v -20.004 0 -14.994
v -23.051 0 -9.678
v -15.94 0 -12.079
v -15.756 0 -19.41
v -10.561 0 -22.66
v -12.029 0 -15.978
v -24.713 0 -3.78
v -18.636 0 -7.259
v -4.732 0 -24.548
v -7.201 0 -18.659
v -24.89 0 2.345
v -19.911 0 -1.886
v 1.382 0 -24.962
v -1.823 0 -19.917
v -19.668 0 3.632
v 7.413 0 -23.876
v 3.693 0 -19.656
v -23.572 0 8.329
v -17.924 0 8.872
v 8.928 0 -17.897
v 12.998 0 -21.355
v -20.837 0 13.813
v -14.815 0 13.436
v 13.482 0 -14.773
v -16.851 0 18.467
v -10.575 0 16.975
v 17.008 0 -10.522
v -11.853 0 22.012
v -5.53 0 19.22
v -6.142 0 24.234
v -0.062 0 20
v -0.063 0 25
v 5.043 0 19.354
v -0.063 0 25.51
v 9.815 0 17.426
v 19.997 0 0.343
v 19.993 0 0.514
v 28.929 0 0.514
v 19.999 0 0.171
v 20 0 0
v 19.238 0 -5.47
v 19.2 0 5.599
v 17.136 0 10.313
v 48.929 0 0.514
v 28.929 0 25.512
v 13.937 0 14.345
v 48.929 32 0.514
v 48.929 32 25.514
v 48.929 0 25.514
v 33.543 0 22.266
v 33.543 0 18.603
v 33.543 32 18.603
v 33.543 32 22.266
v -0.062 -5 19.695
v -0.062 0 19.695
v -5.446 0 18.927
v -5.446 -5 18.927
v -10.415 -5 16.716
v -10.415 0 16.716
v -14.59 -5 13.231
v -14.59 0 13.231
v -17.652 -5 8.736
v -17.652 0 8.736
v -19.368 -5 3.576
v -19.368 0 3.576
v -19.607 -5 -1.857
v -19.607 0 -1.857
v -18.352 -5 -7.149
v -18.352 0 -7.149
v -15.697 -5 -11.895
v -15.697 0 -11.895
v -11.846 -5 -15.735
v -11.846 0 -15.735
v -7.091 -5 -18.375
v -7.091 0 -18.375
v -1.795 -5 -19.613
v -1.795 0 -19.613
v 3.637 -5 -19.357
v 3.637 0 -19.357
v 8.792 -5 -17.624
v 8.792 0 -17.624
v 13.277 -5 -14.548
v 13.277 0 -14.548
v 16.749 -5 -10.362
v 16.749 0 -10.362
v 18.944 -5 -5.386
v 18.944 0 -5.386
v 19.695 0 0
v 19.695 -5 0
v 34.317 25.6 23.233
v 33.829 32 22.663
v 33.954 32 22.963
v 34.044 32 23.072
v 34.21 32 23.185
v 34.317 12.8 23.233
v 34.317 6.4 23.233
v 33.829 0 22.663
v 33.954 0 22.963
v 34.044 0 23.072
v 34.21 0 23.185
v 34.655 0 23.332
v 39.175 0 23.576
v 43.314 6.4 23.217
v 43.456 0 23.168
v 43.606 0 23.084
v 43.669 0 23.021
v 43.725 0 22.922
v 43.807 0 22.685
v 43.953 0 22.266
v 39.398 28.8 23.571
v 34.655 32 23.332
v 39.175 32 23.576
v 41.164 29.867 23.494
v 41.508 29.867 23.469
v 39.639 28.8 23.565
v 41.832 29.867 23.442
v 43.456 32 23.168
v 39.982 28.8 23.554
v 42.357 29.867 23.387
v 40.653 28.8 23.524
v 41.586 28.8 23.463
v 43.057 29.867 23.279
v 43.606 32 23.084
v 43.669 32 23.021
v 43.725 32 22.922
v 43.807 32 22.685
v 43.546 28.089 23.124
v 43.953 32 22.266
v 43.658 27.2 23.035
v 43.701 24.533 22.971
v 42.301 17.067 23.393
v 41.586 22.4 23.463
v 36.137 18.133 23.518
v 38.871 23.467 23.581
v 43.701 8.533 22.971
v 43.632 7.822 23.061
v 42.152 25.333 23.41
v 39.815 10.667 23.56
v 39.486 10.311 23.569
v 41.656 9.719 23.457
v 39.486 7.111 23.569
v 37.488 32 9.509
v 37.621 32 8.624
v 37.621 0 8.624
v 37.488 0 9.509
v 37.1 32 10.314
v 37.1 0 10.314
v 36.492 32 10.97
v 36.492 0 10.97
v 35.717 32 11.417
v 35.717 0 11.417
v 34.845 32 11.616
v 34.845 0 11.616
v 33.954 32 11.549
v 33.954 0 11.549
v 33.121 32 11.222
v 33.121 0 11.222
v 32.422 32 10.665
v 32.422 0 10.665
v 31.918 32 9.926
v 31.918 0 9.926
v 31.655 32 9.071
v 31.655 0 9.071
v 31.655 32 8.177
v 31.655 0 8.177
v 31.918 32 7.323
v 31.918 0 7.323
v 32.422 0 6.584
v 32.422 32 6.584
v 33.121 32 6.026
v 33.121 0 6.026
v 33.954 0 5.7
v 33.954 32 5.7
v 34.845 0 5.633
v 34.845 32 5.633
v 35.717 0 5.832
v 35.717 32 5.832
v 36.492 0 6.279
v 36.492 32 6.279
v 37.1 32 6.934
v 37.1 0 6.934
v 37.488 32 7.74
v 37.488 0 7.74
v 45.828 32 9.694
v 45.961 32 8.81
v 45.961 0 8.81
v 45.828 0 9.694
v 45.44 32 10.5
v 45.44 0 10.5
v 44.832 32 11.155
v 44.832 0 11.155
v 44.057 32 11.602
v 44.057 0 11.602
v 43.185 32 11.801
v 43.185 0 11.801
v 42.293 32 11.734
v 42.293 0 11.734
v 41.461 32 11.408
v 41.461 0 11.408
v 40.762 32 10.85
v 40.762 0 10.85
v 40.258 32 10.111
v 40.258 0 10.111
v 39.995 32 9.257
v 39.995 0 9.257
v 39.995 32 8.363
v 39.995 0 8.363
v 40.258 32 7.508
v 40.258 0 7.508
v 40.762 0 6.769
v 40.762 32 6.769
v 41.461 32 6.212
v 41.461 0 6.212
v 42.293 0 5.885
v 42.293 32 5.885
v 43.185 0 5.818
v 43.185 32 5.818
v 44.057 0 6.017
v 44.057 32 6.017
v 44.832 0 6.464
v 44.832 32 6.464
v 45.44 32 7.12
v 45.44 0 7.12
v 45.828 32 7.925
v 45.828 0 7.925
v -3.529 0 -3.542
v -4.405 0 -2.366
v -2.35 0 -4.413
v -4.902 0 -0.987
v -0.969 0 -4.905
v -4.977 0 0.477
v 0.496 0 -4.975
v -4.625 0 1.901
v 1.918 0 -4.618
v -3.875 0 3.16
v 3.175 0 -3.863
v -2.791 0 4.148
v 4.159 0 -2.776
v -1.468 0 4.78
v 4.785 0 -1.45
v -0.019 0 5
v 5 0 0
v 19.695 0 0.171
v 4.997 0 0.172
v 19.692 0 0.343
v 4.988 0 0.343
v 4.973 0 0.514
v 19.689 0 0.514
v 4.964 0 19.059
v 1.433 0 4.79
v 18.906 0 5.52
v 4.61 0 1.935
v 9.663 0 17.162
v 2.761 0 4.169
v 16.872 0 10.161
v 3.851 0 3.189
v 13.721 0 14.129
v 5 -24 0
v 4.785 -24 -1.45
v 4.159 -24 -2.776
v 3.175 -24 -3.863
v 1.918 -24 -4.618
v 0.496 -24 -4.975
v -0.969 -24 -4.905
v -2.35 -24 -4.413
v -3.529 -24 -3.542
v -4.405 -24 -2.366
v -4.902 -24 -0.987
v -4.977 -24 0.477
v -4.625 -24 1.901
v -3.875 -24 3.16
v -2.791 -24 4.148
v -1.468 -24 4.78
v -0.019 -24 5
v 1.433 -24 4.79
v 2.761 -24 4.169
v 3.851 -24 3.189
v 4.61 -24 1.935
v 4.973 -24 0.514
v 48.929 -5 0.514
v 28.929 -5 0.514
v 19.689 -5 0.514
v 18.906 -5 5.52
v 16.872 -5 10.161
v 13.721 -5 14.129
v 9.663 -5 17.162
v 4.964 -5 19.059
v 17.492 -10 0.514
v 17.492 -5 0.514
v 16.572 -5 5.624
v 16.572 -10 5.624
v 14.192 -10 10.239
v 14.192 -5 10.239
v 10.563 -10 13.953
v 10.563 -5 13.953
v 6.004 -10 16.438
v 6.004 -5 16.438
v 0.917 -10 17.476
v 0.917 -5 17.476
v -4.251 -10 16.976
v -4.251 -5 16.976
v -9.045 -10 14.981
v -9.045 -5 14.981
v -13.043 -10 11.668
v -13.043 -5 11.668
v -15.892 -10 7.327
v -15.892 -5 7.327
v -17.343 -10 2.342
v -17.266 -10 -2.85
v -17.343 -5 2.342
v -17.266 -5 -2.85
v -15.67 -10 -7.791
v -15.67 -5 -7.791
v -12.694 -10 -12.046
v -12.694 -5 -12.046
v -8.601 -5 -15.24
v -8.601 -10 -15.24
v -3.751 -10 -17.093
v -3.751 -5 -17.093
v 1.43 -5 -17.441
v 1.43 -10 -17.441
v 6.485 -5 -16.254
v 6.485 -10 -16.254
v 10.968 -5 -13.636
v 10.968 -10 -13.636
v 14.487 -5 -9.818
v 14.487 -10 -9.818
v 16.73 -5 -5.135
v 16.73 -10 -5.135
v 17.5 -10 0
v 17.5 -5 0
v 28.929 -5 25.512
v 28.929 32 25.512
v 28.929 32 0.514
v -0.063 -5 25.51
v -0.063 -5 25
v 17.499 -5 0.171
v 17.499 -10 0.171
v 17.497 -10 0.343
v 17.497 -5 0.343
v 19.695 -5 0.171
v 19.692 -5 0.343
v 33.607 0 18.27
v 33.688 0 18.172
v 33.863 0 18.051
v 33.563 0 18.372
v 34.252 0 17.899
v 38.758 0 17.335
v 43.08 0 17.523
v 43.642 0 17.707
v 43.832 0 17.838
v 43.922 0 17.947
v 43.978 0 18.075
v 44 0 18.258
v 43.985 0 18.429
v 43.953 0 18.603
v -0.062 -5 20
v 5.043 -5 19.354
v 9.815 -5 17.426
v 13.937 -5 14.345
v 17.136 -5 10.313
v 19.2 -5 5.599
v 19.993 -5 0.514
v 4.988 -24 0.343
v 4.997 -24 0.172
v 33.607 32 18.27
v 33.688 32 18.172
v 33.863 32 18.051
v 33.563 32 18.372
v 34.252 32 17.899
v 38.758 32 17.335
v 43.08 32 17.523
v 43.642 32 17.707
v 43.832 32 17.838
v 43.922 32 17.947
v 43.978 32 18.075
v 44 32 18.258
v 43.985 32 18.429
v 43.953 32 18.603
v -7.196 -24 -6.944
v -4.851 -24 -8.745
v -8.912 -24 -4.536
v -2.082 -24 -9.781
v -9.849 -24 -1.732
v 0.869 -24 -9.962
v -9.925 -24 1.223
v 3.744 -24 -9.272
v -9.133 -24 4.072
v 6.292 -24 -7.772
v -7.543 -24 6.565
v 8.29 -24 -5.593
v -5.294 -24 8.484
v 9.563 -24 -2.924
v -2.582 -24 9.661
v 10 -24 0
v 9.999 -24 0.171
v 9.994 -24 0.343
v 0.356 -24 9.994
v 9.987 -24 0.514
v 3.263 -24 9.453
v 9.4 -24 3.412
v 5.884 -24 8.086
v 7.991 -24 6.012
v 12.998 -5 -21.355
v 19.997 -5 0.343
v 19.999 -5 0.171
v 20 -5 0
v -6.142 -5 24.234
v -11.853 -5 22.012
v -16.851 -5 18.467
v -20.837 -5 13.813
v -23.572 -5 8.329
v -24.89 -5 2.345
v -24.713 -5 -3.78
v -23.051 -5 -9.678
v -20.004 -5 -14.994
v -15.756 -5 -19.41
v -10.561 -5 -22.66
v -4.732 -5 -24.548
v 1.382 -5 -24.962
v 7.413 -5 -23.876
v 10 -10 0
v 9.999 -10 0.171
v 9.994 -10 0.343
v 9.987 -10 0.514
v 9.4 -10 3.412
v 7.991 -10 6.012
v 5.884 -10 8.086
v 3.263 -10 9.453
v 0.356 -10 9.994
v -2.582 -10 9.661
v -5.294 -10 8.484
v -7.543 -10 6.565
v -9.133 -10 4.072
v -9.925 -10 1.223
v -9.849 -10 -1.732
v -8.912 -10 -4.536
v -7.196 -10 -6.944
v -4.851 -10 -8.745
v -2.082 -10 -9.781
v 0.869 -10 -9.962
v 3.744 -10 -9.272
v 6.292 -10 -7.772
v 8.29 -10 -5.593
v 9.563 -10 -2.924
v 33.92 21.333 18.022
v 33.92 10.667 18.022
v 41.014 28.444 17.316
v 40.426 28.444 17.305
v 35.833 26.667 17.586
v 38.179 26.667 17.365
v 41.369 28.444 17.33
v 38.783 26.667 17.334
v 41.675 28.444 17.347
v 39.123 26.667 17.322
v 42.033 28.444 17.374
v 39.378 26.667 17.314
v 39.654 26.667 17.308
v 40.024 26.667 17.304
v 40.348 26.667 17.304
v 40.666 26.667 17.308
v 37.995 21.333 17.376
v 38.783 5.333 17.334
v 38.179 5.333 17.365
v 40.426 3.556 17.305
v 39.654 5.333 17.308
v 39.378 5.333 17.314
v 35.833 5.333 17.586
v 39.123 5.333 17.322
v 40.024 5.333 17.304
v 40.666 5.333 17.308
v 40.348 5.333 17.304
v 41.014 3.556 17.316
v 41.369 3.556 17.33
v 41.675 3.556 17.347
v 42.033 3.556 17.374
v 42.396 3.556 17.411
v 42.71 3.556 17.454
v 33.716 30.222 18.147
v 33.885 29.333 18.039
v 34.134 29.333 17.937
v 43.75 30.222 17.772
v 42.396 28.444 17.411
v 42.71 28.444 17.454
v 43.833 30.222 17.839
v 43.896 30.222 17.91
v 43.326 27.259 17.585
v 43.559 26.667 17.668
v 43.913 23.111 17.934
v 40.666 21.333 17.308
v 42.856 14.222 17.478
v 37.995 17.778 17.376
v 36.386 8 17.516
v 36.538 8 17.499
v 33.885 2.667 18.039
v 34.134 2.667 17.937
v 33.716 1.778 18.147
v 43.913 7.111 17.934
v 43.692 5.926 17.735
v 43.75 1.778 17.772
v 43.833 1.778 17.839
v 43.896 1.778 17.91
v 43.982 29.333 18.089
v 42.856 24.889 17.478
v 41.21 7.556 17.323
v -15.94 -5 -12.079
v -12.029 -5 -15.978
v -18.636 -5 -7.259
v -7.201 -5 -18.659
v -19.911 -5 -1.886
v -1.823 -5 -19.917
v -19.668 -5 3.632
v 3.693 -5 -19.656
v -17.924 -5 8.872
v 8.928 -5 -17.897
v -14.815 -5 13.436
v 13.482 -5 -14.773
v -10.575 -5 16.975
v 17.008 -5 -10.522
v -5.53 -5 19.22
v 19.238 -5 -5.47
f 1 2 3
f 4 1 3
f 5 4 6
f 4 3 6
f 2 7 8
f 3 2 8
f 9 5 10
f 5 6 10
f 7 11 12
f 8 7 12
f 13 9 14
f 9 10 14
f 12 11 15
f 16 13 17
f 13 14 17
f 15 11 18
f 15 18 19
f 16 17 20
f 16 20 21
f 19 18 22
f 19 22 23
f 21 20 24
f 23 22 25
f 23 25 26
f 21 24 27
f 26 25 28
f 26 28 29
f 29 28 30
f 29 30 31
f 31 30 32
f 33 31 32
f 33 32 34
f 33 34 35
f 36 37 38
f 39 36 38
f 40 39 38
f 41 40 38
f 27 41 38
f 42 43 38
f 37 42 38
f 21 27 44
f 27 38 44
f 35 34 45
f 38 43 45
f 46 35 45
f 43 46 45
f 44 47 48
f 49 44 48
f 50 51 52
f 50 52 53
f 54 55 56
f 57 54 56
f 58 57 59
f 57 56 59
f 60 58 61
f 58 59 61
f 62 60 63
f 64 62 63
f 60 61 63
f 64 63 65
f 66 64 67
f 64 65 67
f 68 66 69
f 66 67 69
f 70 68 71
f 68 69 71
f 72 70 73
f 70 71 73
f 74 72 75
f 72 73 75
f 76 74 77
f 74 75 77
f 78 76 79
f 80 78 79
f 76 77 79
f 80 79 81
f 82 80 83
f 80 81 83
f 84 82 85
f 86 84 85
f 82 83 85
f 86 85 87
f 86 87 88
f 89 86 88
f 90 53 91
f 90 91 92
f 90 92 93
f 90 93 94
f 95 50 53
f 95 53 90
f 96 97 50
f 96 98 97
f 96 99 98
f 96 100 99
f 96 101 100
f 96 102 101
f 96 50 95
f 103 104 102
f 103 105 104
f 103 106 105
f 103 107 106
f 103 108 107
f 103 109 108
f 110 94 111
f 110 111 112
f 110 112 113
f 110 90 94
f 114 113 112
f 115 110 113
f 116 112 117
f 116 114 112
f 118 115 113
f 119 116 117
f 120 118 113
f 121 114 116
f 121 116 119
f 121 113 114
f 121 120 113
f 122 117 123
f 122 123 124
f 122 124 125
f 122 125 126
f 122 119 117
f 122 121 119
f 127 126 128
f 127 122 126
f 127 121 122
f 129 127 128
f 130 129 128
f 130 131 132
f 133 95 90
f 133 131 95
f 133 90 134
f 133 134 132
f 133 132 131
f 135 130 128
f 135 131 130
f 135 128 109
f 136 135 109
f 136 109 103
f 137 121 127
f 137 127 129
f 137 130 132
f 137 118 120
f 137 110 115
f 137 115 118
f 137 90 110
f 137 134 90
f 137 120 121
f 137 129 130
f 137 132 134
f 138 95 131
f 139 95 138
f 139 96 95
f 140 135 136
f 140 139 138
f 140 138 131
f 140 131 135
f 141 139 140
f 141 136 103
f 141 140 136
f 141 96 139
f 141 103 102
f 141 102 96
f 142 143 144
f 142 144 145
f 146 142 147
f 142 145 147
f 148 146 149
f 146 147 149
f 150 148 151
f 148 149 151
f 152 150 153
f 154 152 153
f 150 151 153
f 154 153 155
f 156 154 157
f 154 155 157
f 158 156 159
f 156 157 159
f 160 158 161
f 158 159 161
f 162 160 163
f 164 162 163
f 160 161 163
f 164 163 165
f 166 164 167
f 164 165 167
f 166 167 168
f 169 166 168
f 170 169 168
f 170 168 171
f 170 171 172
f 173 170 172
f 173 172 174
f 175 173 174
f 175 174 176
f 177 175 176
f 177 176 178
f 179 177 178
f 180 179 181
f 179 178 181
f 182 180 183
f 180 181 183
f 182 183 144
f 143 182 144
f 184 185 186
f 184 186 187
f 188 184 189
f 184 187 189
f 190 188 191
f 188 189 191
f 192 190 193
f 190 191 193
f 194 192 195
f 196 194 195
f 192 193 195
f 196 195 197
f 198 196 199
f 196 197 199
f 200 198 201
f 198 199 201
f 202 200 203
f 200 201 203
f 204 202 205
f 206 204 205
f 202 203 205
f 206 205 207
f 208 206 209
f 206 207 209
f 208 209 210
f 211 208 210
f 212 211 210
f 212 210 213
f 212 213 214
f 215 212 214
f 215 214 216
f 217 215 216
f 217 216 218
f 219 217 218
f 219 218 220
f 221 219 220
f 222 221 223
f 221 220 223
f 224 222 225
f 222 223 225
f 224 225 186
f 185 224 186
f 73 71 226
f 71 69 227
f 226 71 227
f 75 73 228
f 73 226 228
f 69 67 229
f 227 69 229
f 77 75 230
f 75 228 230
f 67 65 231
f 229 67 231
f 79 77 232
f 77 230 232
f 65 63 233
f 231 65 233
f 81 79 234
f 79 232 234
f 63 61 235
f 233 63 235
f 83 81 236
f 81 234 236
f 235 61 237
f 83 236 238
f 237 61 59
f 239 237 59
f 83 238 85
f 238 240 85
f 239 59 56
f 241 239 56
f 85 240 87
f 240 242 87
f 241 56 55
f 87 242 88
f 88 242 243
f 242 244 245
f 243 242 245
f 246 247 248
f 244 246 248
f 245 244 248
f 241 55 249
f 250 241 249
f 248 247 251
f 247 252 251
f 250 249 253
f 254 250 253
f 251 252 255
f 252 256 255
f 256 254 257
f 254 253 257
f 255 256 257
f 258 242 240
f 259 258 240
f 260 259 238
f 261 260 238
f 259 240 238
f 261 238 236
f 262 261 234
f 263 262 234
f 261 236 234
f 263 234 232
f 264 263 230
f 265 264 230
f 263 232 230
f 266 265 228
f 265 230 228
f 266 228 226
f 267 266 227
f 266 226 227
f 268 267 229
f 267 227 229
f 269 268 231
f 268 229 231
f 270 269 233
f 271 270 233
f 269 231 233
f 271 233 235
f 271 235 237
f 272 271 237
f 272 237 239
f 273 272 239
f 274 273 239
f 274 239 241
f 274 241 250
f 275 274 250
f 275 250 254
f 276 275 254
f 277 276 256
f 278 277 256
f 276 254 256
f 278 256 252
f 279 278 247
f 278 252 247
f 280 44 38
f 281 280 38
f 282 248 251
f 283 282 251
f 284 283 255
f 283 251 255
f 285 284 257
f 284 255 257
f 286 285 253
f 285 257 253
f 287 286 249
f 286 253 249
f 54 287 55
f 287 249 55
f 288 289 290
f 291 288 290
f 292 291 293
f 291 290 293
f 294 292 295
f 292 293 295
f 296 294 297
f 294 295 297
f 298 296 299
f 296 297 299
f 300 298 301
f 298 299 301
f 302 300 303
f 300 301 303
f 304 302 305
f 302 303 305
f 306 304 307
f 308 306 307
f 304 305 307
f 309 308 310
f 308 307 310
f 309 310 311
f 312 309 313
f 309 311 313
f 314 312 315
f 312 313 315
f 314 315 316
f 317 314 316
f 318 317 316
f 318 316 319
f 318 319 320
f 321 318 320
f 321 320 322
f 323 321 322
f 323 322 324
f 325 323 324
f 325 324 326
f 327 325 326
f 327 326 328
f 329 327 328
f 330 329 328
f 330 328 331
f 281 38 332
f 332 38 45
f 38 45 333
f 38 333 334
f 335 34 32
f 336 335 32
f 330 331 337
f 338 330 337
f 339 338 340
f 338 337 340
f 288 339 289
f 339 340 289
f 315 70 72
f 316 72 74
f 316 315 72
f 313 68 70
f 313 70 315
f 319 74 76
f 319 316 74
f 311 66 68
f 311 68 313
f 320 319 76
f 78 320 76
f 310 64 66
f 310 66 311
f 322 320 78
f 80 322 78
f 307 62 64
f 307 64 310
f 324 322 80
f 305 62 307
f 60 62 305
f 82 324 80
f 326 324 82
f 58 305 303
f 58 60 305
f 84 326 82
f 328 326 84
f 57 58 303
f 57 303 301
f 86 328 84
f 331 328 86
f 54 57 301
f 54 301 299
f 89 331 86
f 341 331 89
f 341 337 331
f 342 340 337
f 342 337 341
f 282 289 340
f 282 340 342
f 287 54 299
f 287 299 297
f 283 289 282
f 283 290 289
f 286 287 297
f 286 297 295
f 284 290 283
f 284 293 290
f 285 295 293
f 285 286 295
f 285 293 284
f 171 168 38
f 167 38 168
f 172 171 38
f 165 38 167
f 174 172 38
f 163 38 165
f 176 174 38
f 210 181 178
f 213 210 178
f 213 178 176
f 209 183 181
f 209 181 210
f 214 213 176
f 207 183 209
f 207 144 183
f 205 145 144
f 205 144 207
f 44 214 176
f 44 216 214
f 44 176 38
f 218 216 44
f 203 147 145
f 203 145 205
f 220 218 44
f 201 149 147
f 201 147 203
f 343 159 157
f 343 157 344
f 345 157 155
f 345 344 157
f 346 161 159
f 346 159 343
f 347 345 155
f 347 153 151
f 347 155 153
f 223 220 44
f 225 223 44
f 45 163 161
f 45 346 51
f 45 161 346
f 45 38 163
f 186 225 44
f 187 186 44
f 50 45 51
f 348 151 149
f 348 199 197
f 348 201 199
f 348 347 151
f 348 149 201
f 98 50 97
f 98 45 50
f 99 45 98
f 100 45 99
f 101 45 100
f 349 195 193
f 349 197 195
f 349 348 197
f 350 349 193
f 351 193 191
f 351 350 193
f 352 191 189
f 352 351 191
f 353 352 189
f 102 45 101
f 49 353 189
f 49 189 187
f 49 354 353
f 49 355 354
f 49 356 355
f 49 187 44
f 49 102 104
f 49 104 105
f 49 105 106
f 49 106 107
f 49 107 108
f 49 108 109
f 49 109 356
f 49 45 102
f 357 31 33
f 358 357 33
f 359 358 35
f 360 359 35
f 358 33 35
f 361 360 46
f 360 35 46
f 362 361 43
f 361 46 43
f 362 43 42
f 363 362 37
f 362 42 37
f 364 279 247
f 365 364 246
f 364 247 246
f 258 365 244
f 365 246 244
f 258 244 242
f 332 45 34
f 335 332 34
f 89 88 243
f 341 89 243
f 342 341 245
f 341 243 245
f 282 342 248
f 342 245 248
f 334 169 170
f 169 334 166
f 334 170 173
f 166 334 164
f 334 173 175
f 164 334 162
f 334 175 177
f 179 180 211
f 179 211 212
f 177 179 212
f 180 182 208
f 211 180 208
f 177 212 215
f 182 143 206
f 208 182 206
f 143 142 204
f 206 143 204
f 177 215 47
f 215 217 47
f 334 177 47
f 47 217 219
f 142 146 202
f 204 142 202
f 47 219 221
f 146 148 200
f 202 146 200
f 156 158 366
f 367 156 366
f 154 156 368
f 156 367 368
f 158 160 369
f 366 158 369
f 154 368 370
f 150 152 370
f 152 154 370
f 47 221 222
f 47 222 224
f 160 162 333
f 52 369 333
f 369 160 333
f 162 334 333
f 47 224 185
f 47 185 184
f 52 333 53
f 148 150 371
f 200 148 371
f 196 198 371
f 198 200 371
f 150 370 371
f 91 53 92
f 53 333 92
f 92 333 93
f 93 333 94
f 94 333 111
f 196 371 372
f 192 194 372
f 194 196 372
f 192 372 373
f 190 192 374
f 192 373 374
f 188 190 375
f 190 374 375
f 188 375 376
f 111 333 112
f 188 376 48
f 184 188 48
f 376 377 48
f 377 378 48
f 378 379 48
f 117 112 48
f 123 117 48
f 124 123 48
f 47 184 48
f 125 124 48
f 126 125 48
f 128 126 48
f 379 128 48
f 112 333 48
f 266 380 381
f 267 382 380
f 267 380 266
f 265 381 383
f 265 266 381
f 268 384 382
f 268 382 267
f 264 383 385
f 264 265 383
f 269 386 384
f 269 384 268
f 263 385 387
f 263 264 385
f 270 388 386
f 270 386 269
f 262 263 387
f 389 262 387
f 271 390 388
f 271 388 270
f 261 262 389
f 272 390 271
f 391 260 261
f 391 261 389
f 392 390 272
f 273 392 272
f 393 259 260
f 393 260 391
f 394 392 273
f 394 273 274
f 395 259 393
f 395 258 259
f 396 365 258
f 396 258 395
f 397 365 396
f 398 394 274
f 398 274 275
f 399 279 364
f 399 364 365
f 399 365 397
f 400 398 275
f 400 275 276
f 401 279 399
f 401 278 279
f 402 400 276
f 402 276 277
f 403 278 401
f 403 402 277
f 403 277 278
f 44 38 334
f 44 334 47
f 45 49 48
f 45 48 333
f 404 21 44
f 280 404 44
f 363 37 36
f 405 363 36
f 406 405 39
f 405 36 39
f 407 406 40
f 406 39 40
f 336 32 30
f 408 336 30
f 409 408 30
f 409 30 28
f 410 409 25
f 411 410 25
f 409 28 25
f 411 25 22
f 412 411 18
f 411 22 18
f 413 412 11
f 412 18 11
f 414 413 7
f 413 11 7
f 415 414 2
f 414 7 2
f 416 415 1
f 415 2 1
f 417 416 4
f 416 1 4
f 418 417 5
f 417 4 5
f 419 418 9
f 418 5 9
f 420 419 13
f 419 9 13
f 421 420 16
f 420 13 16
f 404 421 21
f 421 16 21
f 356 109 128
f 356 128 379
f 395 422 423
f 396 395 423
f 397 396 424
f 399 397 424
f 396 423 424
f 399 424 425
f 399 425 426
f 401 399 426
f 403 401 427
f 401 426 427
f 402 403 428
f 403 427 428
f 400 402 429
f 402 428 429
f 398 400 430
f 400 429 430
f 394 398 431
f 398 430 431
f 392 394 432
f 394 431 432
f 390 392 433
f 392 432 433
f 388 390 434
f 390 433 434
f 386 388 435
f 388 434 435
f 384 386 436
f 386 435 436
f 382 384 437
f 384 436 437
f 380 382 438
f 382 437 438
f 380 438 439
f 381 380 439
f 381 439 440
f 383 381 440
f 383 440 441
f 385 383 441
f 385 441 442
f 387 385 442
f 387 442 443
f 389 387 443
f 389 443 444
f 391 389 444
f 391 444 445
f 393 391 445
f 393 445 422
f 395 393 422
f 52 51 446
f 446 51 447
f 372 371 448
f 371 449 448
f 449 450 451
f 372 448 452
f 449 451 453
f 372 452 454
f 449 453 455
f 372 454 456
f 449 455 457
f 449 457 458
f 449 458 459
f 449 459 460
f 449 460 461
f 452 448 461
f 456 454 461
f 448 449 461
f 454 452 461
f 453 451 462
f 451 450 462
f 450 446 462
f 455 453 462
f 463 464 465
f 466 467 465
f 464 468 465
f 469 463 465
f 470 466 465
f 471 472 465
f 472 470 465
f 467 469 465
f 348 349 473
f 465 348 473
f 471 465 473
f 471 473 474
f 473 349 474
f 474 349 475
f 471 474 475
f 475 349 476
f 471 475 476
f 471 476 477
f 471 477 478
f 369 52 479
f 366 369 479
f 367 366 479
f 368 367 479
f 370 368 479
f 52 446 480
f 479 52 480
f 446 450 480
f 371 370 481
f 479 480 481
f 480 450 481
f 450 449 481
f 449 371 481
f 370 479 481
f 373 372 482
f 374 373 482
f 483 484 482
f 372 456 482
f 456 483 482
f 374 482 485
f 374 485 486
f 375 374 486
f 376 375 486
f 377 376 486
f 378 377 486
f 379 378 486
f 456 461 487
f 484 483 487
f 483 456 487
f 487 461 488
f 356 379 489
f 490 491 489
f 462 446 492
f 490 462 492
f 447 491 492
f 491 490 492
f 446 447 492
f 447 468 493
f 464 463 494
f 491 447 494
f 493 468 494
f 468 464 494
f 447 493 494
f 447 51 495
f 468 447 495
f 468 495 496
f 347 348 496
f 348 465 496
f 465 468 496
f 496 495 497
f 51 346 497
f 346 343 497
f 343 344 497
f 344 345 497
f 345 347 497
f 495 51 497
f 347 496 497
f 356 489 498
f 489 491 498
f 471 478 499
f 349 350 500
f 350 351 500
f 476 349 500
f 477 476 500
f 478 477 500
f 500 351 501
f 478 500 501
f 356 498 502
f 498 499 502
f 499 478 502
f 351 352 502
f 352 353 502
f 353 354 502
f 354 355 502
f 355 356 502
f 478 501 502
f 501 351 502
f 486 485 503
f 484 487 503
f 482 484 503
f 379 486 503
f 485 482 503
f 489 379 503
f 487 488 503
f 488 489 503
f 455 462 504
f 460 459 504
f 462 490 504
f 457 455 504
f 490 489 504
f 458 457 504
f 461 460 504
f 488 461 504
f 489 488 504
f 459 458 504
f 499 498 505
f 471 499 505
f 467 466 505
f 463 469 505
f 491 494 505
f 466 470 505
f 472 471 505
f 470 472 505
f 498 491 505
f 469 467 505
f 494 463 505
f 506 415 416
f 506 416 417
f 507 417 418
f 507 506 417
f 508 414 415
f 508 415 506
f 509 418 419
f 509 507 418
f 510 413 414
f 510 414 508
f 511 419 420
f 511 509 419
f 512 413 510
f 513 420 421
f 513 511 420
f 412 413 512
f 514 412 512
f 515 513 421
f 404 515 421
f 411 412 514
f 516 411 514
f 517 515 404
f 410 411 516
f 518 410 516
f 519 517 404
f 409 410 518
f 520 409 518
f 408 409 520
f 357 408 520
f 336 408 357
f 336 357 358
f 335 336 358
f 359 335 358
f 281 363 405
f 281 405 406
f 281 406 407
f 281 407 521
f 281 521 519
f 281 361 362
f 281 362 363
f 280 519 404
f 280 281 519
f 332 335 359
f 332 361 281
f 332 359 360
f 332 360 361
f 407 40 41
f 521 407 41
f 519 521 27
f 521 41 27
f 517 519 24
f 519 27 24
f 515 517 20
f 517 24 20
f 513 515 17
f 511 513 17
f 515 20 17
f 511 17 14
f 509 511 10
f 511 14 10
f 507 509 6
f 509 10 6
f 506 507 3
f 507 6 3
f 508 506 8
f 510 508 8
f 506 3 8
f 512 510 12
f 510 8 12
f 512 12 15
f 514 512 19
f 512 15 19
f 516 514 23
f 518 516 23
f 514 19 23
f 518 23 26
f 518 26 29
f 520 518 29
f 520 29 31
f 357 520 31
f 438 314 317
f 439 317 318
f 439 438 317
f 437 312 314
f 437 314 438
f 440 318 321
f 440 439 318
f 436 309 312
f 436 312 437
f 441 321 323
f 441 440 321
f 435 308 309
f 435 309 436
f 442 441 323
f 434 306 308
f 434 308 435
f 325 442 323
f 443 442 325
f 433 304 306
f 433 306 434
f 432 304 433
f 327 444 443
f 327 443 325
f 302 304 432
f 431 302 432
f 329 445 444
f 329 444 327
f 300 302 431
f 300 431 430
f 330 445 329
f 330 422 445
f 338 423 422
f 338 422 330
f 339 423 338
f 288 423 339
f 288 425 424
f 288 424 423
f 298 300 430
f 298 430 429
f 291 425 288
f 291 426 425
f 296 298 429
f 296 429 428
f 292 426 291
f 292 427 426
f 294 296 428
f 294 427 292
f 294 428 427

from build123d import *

# Parameters (mm, degrees)
F1_DEPTH = 5
F2_DEPTH = 10
F3_DEPTH = 24
F4_DEPTH = 5
F0_W     = 19.9999999128
F0_H     = 16.0793430998
F0_R     = 3
F5_DEPTH = 32


with BuildPart() as f1:
    # F0 (on Front) → F1 (new body)
    with BuildSketch(Plane.XZ):
        with BuildLine():
            ThreePointArc((19.6885552701, 0.5142584548), (13.7212705794, 14.1290623918), (-0.0624083048, 19.6951713774))
            ThreePointArc((-0.0624083048, 19.6951713774), (-13.9045769794, -13.9487063704), (19.6952702541, 0))
            ThreePointArc((19.6952702541, 0), (19.6935914366, 0.2571511469), (19.6885552701, 0.5142584548))
        make_face()
        with BuildLine():
            ThreePointArc((17.5, 0), (-17.4981104774, -0.2571569934), (17.4924423178, 0.5142584548))
            ThreePointArc((17.4924423178, 0.5142584548), (17.4981104774, 0.2571569934), (17.5, 0))
        make_face(mode=Mode.SUBTRACT)
    extrude(amount=F1_DEPTH)

    # F0 (on Front) → F2 (join)
    with BuildSketch(Plane.XZ):
        with BuildLine():
            ThreePointArc((17.5, 0), (17.4981104774, 0.2571569934), (17.4924423178, 0.5142584548))
            ThreePointArc((17.4924423178, 0.5142584548), (-17.4981104774, -0.2571569934), (17.5, 0))
        make_face()
        with BuildLine():
            ThreePointArc((10, 0), (-9.9966914922, -0.257214327), (9.986768158, 0.5142584548))
            ThreePointArc((9.986768158, 0.5142584548), (9.9966914922, 0.257214327), (10, 0))
        make_face(mode=Mode.SUBTRACT)
    extrude(amount=F2_DEPTH)

    # F0 (on Front) → F3 (join)
    with BuildSketch(Plane.XZ):
        with BuildLine():
            ThreePointArc((10, 0), (9.9966914922, 0.257214327), (9.986768158, 0.5142584548))
            ThreePointArc((9.986768158, 0.5142584548), (-9.9966914922, -0.257214327), (10, 0))
        make_face()
        with BuildLine():
            ThreePointArc((5, 0), (-4.9933664776, -0.2574708151), (4.9734835117, 0.5142584548))
            ThreePointArc((4.9734835117, 0.5142584548), (4.9933664776, 0.2574708151), (5, 0))
        make_face(mode=Mode.SUBTRACT)
    extrude(amount=F3_DEPTH)


with BuildPart() as f4:
    # F0 (on Front) → F4 (new body)
    with BuildSketch(Plane.XZ):
        with BuildLine():
            Line((48.9291776827, 0.5142584548), (28.9291777699, 0.5142584548))
            Line((28.9291777699, 0.5142584548), (28.9291777699, 16.5936015546))
            Line((28.9291777699, 16.5936015546), (28.9291777699, 25.5123911165))
            Line((28.9291777699, 25.5123911165), (-0.062951188, 25.5096842107))
            Line((-0.062951188, 25.5096842107), (-0.062903593, 24.9999208626))
            ThreePointArc((-0.062903593, 24.9999208626), (-24.0630921848, -6.7799405976), (12.9980148264, -21.3553649131))
            Line((12.9980148264, -21.3553649131), (48.9291776827, 0.5142584548))
        make_face()
        with BuildLine():
            ThreePointArc((20, 0), (-14.1200436413, -14.1641931492), (-0.0624367567, 19.999902541))
            ThreePointArc((-0.0624367567, 19.999902541), (13.936760003, 14.3445711201), (19.9933873629, 0.5142584548))
            ThreePointArc((19.9933873629, 0.5142584548), (19.9983467724, 0.2571504838), (20, 0))
        make_face(mode=Mode.SUBTRACT)
    extrude(amount=F4_DEPTH)

    # F0 (on Front) → F5 (join)
    with BuildSketch(Plane.XZ):
        with Locations((38.9291777263, 8.5539300047)):
            Rectangle(F0_W, F0_H)
        with Locations((34.6211157739, 8.624332957)):
            Circle(F0_R, mode=Mode.SUBTRACT)
        with Locations((42.9610460997, 8.809665218)):
            Circle(F0_R, mode=Mode.SUBTRACT)
        Polygon((28.9291777699, 25.5123911165), (28.9291777699, 16.5936015546), (48.9291776827, 16.5936015546), (48.9291776827, 25.5142584548), align=None)
        with BuildLine():
            Line((33.5434526205, 18.6031218618), (33.5434526205, 22.2659111023))
            add(Edge.make_bspline(
                [(33.5434526205, 22.2659111023), (33.6592351355, 22.3999873246), (33.9122815123, 22.6930151819), (33.941472744, 23.8171713388), (43.5232256, 23.5869056558), (43.7403175902, 22.869850346), (43.8821976786, 22.467888622), (43.9534895122, 22.2659111023)],
                knots=[0, 0, 0, 0, 0.1175287878, 0.2568629118, 0.7478550882, 0.8733023548, 1, 1, 1, 1], degree=3))
            Line((43.9534895122, 22.2659111023), (43.9534895122, 18.6031218618))
            add(Edge.make_bspline(
                [(33.5434526205, 18.6031218618), (33.5413148269, 18.4025177074), (33.5311730419, 17.4508429484), (44.2953377816, 16.8523187746), (44.019580962, 18.2646292475), (43.9534895122, 18.6031218618)],
                knots=[0, 0, 0, 0, 0.1687976394, 0.80078328, 1, 1, 1, 1], degree=3))
        make_face(mode=Mode.SUBTRACT)
    extrude(amount=-F5_DEPTH)


solid = Compound([f1.part, f4.part])
